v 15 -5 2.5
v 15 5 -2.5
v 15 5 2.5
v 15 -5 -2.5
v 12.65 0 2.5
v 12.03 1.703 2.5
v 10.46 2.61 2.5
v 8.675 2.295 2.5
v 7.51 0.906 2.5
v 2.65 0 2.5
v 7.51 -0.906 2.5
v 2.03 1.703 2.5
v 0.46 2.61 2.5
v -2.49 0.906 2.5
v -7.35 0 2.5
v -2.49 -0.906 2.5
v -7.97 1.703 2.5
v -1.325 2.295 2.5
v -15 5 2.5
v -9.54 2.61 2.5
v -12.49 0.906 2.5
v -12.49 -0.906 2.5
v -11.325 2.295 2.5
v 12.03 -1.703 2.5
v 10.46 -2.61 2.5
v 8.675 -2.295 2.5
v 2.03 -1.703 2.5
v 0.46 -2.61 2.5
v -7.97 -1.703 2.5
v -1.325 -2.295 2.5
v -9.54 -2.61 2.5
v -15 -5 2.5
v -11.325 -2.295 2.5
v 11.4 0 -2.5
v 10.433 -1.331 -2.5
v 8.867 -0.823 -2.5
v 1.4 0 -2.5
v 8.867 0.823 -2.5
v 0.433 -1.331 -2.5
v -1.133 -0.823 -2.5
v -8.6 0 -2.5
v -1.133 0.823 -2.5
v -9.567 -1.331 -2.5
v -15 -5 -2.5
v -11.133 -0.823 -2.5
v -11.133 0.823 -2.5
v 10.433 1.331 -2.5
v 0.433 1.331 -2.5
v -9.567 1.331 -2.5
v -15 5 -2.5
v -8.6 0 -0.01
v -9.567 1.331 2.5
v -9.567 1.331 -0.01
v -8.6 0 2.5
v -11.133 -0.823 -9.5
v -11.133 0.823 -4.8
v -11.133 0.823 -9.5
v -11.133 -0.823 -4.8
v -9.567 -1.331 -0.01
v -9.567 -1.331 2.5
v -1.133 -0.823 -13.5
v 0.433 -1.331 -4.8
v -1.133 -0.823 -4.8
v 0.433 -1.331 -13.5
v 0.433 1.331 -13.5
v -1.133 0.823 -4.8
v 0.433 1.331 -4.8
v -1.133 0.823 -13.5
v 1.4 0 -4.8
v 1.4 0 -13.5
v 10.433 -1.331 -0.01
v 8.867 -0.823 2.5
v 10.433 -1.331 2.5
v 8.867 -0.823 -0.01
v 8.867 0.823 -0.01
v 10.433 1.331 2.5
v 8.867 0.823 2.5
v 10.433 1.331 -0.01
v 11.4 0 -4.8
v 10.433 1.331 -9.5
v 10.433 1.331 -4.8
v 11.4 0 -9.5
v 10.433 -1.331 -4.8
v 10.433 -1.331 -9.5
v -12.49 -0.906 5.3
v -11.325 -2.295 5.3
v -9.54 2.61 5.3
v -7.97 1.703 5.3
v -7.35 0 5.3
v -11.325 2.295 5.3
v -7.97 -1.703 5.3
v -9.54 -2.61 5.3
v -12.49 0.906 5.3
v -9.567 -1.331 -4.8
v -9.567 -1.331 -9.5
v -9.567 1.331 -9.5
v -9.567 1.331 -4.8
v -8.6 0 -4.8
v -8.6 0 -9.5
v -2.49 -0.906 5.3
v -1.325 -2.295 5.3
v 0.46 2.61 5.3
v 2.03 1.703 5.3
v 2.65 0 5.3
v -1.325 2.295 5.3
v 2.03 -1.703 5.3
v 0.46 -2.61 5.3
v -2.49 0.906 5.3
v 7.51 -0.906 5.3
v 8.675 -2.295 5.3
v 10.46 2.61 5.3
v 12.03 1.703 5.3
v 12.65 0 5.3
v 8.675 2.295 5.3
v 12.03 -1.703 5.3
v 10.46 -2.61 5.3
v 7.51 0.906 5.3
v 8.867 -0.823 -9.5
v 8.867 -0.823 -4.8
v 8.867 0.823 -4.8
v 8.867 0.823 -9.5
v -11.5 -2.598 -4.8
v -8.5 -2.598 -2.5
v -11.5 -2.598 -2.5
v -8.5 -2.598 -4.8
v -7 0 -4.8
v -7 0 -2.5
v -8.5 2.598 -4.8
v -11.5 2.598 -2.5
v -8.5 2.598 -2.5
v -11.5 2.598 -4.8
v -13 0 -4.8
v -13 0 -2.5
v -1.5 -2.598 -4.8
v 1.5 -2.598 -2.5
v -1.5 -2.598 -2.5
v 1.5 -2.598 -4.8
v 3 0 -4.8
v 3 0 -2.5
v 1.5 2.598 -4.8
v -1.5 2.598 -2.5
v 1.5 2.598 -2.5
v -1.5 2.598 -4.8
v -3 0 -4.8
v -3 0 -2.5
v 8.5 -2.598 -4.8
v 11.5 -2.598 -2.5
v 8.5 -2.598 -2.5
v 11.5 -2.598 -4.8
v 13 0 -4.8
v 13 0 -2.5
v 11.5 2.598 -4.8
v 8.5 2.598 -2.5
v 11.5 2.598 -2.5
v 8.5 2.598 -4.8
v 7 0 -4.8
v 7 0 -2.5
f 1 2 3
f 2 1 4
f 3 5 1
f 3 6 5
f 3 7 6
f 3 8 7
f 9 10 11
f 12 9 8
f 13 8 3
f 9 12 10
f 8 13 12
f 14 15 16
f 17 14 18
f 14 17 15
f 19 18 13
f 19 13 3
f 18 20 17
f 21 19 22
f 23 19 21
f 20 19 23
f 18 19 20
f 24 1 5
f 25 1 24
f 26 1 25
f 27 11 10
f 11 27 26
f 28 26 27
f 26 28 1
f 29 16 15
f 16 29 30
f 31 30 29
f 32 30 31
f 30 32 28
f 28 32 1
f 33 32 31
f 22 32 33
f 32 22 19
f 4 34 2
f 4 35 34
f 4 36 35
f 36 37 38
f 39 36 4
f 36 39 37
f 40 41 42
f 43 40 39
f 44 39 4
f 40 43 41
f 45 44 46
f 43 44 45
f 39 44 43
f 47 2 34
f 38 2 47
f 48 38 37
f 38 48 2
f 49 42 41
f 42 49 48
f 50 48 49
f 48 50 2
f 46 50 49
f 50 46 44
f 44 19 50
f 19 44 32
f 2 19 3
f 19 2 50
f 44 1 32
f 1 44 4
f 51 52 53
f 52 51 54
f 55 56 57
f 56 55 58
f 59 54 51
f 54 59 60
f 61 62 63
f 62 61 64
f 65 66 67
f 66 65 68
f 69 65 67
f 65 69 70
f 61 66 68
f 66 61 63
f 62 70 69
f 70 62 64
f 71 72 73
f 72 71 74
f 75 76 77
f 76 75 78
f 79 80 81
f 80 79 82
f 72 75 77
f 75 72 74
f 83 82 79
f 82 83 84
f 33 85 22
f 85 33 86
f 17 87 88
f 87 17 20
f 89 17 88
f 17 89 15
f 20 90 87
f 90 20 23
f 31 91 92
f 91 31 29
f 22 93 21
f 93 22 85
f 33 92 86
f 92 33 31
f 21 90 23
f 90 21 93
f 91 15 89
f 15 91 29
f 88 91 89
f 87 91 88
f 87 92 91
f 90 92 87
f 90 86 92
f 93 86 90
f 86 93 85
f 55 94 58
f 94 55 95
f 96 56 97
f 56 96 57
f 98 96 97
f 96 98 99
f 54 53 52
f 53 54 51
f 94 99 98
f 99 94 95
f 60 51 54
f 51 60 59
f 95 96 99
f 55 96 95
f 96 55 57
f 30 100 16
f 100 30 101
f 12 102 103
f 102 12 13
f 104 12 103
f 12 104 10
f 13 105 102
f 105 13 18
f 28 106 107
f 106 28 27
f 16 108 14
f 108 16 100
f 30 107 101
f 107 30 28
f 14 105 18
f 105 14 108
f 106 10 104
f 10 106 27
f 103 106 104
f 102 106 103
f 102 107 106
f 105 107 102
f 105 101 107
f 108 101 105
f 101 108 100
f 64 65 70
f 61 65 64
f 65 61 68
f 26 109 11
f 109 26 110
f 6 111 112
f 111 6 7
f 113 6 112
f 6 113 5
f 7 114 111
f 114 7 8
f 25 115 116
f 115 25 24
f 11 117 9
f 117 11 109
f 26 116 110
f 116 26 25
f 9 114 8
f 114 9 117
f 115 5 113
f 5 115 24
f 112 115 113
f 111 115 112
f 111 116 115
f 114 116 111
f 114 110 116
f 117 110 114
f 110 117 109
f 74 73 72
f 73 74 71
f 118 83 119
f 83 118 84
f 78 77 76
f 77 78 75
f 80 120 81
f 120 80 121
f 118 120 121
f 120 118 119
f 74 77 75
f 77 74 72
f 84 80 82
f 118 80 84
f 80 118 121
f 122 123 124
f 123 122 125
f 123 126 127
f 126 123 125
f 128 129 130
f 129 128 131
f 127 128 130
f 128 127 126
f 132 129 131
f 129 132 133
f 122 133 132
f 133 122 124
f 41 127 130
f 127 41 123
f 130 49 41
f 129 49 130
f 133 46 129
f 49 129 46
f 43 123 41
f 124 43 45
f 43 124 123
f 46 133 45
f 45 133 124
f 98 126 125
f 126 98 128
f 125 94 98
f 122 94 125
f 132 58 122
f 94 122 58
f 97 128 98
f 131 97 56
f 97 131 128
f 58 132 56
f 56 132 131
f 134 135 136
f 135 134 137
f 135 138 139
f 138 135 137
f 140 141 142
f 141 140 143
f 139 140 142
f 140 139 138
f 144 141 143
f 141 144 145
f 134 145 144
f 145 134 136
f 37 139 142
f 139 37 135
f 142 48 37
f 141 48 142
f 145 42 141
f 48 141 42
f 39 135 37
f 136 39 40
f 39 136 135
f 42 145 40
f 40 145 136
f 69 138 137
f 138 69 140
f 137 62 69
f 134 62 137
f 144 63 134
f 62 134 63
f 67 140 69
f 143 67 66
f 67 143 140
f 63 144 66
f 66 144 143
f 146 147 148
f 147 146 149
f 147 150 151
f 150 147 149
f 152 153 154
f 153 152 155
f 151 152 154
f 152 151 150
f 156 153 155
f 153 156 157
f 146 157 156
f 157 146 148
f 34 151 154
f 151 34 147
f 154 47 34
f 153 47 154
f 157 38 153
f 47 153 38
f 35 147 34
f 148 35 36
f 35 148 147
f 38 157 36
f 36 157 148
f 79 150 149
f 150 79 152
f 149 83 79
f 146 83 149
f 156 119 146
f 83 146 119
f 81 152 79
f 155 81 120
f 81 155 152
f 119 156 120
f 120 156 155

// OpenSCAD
// Generated by SolidPython 0.4.5 on 2019-12-22 19:00:26


union() {
	color(c = "blue") {
		difference() {
			cube(center = true, size = [30, 10, 5]);
			translate(v = [-10, 0, 0]) {
				translate(v = [0, 0, -0.0100000000]) {
					cylinder(h = 5.0200000000, r = 1.4000000000);
				}
			}
			translate(v = [0, 0, -0.0100000000]) {
				cylinder(h = 5.0200000000, r = 1.4000000000);
			}
			translate(v = [10, 0, 0]) {
				translate(v = [0, 0, -0.0100000000]) {
					cylinder(h = 5.0200000000, r = 1.4000000000);
				}
			}
		}
	}
	translate(v = [-10, 0, 2.5000000000]) {
		union() {
			cylinder(h = 2.8000000000, r = 2.6500000000);
			translate(v = [0, 0, -12]) {
				cylinder(h = 12, r = 1.4000000000);
			}
		}
	}
	translate(v = [0, 0, 2.5000000000]) {
		union() {
			cylinder(h = 2.8000000000, r = 2.6500000000);
			translate(v = [0, 0, -16]) {
				cylinder(h = 16, r = 1.4000000000);
			}
		}
	}
	translate(v = [10, 0, 2.5000000000]) {
		union() {
			cylinder(h = 2.8000000000, r = 2.6500000000);
			translate(v = [0, 0, -12]) {
				cylinder(h = 12, r = 1.4000000000);
			}
		}
	}
	translate(v = [-10, 0, -4.8000000000]) {
		difference() {
			cylinder($fn = 6, h = 2.3000000000, r = 3);
			translate(v = [0, 0, -0.0100000000]) {
				cylinder(h = 2.3200000000, r = 1.4000000000);
			}
		}
	}
	translate(v = [0, 0, -4.8000000000]) {
		difference() {
			cylinder($fn = 6, h = 2.3000000000, r = 3);
			translate(v = [0, 0, -0.0100000000]) {
				cylinder(h = 2.3200000000, r = 1.4000000000);
			}
		}
	}
	translate(v = [10, 0, -4.8000000000]) {
		difference() {
			cylinder($fn = 6, h = 2.3000000000, r = 3);
			translate(v = [0, 0, -0.0100000000]) {
				cylinder(h = 2.3200000000, r = 1.4000000000);
			}
		}
	}
}
/***********************************************
*********      SolidPython code:      **********
************************************************
 
#! /usr/bin/env python3

# Basic shape with several repeated parts, demonstrating the use of
# solid.utils.bill_of_materials()
#
# Basically:
#   -- Define every part you want in the Bill of Materials in a function
#   -- Use the 'bom_part' decorator ahead of the definition of each part's function
#           e.g.:
# @bom_part()
# def my_part():
#     pass
#   -- Optionally, you can add a description and a per-unit cost to the
#       decorator invocations.
#
#   -- To generate the bill of materials, call solid.utils.bill_of_materials()
#
#       -ETJ 08 Mar 2011

import sys

from solid import scad_render_to_file
from solid.objects import cube, color, cylinder, difference, translate, union
from solid.utils import EPSILON
from solid.utils import bill_of_materials, bom_part, set_bom_headers

head_rad = 2.65
head_height = 2.8

nut_height = 2.3
nut_rad = 3

m3_rad = 1.4

doohickey_h = 5

set_bom_headers("link", "leftover")


def head():
    return cylinder(h=head_height, r=head_rad)


@bom_part("M3x16 Bolt", 0.12, currency="€", link="http://example.io/M3x16", leftover=0)
def m3_16(a=3):
    bolt_height = 16
    m = union()(
            head(),
            translate((0, 0, -bolt_height))(
                    cylinder(r=m3_rad, h=bolt_height)
            )
    )
    return m


@bom_part("M3x12 Bolt", 0.09, leftover=0)
def m3_12():
    bolt_height = 12
    m = union()(
            head(),
            translate((0, 0, -bolt_height))(
                    cylinder(r=m3_rad, h=bolt_height)
            )
    )
    return m


@bom_part("M3 Nut", 0.04, currency="R$")
def m3_nut():
    hx = cylinder(r=nut_rad, h=nut_height)
    hx.add_param('$fn', 6)  # make the nut hexagonal
    n = difference()(
            hx,
            translate((0, 0, -EPSILON))(
                    cylinder(r=m3_rad, h=nut_height + 2 * EPSILON)
            )
    )
    return n


@bom_part()
def doohickey(c):
    hole_cyl = translate((0, 0, -EPSILON))(
            cylinder(r=m3_rad, h=doohickey_h + 2 * EPSILON)
    )
    d = difference()(
            cube([30, 10, doohickey_h], center=True),
            translate((-10, 0, 0))(hole_cyl),
            hole_cyl,
            translate((10, 0, 0))(hole_cyl)
    )
    return color(c)(d)


def assembly():
    return union()(
            doohickey(c='blue'),
            translate((-10, 0, doohickey_h / 2))(m3_12()),
            translate((0, 0, doohickey_h / 2))(m3_16()),
            translate((10, 0, doohickey_h / 2))(m3_12()),
            # Nuts
            translate((-10, 0, -nut_height - doohickey_h / 2))(m3_nut()),
            translate((0, 0, -nut_height - doohickey_h / 2))(m3_nut()),
            translate((10, 0, -nut_height - doohickey_h / 2))(m3_nut()),
    )


if __name__ == '__main__':
    out_dir = sys.argv[1] if len(sys.argv) > 1 else None

    a = assembly()
    bom = bill_of_materials()
    file_out = scad_render_to_file(a, out_dir=out_dir)

    print(f"{__file__}: SCAD file written to: \n{file_out}")
    print(bom)

    print("Or, Spreadsheet-ready TSV:\n\n")
    bom = bill_of_materials(csv=True)
    print(bom)
 
 
************************************************/
